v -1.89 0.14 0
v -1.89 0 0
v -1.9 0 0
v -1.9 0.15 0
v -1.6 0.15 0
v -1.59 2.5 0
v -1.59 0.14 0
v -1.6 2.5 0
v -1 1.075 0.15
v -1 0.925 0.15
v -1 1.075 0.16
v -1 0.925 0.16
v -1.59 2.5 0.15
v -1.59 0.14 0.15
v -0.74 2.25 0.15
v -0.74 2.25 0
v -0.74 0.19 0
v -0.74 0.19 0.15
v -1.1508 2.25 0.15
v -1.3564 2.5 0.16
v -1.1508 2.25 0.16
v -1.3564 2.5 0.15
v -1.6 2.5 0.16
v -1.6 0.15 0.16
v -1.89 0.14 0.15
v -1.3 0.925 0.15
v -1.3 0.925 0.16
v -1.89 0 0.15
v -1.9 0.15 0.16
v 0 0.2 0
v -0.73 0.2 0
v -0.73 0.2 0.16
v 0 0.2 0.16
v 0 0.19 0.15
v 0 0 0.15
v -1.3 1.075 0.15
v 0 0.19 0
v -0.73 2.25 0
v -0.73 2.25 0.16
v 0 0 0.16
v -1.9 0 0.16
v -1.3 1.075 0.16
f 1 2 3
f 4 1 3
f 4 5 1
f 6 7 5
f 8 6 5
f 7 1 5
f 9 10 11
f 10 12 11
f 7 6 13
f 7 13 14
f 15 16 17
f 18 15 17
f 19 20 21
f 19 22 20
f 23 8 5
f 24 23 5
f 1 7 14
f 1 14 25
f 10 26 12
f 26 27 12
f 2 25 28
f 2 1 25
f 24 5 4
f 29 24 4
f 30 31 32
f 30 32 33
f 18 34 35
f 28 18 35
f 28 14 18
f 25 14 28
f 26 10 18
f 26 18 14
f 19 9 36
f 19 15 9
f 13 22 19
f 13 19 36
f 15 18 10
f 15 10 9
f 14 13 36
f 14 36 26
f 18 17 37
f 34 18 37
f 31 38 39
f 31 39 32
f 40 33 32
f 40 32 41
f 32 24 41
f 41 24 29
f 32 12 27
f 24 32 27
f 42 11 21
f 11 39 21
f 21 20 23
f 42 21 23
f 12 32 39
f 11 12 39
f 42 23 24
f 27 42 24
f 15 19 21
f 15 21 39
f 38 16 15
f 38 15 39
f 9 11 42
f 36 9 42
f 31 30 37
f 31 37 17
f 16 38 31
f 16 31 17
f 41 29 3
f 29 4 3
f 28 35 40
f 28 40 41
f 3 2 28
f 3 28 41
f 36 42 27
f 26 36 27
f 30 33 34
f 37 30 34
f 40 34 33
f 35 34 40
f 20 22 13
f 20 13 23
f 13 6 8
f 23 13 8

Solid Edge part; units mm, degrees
sketch "Sketch1" plane through (0, 0, 0) normal (0, 0, 1) x (1, 0, 0)
  line L0 (0, 0.2) -> (0, 0)
  line L1 (0, 0) -> (-1.9, 0)
  line L2 (-1.9, 0.15) -> (-1.9, 0)
  line L3 (-1.6, 0.15) -> (-1.9, 0.15)
  line L4 (-1.6, 2.5) -> (-1.6, 0.15)
  line L5 (-1.3564, 2.5) -> (-1.6, 2.5)
  line L6 (-1.3564, 2.5) -> (-1.1508, 2.25)
  line L7 (-1.1508, 2.25) -> (-0.73, 2.25)
  line L8 (-0.73, 2.25) -> (-0.73, 0.2)
  line L9 (-0.73, 0.2) -> (0, 0.2)
  dimension "D1" = 0.73
  dimension "D2" = 0.2
  dimension "D3" = 1.9
  dimension "D4" = 1.6
  dimension "D5" = 0.15
extrude "Protrusion1" add sketch "Sketch1" along normal blind 0.16
shell "Dünnwand_1" thickness 0.01 removed faces 6 at (-0.931, 0.4417, 0) at (-0.2977, 0, 0.1317) at (0, 0.1687, 0.1317) at (-1.3946, 2.5, 0.1317) at (-1.0849, 2.25, 0.1317) at (-1.3242, 2.4608, 0.1317)
sketch "Sketch2" plane through (-0.95, 1.25, 0.16) normal (0, 0, 1) x (1, 0, 0)
  line L0 (-0.35, -0.325) -> (-0.05, -0.325)
  line L1 (-0.05, -0.325) -> (-0.05, -0.175)
  line L2 (-0.05, -0.175) -> (-0.35, -0.175)
  line L3 (-0.35, -0.175) -> (-0.35, -0.325)
extrude "Cutout1" cut sketch "Sketch2" against normal through all
